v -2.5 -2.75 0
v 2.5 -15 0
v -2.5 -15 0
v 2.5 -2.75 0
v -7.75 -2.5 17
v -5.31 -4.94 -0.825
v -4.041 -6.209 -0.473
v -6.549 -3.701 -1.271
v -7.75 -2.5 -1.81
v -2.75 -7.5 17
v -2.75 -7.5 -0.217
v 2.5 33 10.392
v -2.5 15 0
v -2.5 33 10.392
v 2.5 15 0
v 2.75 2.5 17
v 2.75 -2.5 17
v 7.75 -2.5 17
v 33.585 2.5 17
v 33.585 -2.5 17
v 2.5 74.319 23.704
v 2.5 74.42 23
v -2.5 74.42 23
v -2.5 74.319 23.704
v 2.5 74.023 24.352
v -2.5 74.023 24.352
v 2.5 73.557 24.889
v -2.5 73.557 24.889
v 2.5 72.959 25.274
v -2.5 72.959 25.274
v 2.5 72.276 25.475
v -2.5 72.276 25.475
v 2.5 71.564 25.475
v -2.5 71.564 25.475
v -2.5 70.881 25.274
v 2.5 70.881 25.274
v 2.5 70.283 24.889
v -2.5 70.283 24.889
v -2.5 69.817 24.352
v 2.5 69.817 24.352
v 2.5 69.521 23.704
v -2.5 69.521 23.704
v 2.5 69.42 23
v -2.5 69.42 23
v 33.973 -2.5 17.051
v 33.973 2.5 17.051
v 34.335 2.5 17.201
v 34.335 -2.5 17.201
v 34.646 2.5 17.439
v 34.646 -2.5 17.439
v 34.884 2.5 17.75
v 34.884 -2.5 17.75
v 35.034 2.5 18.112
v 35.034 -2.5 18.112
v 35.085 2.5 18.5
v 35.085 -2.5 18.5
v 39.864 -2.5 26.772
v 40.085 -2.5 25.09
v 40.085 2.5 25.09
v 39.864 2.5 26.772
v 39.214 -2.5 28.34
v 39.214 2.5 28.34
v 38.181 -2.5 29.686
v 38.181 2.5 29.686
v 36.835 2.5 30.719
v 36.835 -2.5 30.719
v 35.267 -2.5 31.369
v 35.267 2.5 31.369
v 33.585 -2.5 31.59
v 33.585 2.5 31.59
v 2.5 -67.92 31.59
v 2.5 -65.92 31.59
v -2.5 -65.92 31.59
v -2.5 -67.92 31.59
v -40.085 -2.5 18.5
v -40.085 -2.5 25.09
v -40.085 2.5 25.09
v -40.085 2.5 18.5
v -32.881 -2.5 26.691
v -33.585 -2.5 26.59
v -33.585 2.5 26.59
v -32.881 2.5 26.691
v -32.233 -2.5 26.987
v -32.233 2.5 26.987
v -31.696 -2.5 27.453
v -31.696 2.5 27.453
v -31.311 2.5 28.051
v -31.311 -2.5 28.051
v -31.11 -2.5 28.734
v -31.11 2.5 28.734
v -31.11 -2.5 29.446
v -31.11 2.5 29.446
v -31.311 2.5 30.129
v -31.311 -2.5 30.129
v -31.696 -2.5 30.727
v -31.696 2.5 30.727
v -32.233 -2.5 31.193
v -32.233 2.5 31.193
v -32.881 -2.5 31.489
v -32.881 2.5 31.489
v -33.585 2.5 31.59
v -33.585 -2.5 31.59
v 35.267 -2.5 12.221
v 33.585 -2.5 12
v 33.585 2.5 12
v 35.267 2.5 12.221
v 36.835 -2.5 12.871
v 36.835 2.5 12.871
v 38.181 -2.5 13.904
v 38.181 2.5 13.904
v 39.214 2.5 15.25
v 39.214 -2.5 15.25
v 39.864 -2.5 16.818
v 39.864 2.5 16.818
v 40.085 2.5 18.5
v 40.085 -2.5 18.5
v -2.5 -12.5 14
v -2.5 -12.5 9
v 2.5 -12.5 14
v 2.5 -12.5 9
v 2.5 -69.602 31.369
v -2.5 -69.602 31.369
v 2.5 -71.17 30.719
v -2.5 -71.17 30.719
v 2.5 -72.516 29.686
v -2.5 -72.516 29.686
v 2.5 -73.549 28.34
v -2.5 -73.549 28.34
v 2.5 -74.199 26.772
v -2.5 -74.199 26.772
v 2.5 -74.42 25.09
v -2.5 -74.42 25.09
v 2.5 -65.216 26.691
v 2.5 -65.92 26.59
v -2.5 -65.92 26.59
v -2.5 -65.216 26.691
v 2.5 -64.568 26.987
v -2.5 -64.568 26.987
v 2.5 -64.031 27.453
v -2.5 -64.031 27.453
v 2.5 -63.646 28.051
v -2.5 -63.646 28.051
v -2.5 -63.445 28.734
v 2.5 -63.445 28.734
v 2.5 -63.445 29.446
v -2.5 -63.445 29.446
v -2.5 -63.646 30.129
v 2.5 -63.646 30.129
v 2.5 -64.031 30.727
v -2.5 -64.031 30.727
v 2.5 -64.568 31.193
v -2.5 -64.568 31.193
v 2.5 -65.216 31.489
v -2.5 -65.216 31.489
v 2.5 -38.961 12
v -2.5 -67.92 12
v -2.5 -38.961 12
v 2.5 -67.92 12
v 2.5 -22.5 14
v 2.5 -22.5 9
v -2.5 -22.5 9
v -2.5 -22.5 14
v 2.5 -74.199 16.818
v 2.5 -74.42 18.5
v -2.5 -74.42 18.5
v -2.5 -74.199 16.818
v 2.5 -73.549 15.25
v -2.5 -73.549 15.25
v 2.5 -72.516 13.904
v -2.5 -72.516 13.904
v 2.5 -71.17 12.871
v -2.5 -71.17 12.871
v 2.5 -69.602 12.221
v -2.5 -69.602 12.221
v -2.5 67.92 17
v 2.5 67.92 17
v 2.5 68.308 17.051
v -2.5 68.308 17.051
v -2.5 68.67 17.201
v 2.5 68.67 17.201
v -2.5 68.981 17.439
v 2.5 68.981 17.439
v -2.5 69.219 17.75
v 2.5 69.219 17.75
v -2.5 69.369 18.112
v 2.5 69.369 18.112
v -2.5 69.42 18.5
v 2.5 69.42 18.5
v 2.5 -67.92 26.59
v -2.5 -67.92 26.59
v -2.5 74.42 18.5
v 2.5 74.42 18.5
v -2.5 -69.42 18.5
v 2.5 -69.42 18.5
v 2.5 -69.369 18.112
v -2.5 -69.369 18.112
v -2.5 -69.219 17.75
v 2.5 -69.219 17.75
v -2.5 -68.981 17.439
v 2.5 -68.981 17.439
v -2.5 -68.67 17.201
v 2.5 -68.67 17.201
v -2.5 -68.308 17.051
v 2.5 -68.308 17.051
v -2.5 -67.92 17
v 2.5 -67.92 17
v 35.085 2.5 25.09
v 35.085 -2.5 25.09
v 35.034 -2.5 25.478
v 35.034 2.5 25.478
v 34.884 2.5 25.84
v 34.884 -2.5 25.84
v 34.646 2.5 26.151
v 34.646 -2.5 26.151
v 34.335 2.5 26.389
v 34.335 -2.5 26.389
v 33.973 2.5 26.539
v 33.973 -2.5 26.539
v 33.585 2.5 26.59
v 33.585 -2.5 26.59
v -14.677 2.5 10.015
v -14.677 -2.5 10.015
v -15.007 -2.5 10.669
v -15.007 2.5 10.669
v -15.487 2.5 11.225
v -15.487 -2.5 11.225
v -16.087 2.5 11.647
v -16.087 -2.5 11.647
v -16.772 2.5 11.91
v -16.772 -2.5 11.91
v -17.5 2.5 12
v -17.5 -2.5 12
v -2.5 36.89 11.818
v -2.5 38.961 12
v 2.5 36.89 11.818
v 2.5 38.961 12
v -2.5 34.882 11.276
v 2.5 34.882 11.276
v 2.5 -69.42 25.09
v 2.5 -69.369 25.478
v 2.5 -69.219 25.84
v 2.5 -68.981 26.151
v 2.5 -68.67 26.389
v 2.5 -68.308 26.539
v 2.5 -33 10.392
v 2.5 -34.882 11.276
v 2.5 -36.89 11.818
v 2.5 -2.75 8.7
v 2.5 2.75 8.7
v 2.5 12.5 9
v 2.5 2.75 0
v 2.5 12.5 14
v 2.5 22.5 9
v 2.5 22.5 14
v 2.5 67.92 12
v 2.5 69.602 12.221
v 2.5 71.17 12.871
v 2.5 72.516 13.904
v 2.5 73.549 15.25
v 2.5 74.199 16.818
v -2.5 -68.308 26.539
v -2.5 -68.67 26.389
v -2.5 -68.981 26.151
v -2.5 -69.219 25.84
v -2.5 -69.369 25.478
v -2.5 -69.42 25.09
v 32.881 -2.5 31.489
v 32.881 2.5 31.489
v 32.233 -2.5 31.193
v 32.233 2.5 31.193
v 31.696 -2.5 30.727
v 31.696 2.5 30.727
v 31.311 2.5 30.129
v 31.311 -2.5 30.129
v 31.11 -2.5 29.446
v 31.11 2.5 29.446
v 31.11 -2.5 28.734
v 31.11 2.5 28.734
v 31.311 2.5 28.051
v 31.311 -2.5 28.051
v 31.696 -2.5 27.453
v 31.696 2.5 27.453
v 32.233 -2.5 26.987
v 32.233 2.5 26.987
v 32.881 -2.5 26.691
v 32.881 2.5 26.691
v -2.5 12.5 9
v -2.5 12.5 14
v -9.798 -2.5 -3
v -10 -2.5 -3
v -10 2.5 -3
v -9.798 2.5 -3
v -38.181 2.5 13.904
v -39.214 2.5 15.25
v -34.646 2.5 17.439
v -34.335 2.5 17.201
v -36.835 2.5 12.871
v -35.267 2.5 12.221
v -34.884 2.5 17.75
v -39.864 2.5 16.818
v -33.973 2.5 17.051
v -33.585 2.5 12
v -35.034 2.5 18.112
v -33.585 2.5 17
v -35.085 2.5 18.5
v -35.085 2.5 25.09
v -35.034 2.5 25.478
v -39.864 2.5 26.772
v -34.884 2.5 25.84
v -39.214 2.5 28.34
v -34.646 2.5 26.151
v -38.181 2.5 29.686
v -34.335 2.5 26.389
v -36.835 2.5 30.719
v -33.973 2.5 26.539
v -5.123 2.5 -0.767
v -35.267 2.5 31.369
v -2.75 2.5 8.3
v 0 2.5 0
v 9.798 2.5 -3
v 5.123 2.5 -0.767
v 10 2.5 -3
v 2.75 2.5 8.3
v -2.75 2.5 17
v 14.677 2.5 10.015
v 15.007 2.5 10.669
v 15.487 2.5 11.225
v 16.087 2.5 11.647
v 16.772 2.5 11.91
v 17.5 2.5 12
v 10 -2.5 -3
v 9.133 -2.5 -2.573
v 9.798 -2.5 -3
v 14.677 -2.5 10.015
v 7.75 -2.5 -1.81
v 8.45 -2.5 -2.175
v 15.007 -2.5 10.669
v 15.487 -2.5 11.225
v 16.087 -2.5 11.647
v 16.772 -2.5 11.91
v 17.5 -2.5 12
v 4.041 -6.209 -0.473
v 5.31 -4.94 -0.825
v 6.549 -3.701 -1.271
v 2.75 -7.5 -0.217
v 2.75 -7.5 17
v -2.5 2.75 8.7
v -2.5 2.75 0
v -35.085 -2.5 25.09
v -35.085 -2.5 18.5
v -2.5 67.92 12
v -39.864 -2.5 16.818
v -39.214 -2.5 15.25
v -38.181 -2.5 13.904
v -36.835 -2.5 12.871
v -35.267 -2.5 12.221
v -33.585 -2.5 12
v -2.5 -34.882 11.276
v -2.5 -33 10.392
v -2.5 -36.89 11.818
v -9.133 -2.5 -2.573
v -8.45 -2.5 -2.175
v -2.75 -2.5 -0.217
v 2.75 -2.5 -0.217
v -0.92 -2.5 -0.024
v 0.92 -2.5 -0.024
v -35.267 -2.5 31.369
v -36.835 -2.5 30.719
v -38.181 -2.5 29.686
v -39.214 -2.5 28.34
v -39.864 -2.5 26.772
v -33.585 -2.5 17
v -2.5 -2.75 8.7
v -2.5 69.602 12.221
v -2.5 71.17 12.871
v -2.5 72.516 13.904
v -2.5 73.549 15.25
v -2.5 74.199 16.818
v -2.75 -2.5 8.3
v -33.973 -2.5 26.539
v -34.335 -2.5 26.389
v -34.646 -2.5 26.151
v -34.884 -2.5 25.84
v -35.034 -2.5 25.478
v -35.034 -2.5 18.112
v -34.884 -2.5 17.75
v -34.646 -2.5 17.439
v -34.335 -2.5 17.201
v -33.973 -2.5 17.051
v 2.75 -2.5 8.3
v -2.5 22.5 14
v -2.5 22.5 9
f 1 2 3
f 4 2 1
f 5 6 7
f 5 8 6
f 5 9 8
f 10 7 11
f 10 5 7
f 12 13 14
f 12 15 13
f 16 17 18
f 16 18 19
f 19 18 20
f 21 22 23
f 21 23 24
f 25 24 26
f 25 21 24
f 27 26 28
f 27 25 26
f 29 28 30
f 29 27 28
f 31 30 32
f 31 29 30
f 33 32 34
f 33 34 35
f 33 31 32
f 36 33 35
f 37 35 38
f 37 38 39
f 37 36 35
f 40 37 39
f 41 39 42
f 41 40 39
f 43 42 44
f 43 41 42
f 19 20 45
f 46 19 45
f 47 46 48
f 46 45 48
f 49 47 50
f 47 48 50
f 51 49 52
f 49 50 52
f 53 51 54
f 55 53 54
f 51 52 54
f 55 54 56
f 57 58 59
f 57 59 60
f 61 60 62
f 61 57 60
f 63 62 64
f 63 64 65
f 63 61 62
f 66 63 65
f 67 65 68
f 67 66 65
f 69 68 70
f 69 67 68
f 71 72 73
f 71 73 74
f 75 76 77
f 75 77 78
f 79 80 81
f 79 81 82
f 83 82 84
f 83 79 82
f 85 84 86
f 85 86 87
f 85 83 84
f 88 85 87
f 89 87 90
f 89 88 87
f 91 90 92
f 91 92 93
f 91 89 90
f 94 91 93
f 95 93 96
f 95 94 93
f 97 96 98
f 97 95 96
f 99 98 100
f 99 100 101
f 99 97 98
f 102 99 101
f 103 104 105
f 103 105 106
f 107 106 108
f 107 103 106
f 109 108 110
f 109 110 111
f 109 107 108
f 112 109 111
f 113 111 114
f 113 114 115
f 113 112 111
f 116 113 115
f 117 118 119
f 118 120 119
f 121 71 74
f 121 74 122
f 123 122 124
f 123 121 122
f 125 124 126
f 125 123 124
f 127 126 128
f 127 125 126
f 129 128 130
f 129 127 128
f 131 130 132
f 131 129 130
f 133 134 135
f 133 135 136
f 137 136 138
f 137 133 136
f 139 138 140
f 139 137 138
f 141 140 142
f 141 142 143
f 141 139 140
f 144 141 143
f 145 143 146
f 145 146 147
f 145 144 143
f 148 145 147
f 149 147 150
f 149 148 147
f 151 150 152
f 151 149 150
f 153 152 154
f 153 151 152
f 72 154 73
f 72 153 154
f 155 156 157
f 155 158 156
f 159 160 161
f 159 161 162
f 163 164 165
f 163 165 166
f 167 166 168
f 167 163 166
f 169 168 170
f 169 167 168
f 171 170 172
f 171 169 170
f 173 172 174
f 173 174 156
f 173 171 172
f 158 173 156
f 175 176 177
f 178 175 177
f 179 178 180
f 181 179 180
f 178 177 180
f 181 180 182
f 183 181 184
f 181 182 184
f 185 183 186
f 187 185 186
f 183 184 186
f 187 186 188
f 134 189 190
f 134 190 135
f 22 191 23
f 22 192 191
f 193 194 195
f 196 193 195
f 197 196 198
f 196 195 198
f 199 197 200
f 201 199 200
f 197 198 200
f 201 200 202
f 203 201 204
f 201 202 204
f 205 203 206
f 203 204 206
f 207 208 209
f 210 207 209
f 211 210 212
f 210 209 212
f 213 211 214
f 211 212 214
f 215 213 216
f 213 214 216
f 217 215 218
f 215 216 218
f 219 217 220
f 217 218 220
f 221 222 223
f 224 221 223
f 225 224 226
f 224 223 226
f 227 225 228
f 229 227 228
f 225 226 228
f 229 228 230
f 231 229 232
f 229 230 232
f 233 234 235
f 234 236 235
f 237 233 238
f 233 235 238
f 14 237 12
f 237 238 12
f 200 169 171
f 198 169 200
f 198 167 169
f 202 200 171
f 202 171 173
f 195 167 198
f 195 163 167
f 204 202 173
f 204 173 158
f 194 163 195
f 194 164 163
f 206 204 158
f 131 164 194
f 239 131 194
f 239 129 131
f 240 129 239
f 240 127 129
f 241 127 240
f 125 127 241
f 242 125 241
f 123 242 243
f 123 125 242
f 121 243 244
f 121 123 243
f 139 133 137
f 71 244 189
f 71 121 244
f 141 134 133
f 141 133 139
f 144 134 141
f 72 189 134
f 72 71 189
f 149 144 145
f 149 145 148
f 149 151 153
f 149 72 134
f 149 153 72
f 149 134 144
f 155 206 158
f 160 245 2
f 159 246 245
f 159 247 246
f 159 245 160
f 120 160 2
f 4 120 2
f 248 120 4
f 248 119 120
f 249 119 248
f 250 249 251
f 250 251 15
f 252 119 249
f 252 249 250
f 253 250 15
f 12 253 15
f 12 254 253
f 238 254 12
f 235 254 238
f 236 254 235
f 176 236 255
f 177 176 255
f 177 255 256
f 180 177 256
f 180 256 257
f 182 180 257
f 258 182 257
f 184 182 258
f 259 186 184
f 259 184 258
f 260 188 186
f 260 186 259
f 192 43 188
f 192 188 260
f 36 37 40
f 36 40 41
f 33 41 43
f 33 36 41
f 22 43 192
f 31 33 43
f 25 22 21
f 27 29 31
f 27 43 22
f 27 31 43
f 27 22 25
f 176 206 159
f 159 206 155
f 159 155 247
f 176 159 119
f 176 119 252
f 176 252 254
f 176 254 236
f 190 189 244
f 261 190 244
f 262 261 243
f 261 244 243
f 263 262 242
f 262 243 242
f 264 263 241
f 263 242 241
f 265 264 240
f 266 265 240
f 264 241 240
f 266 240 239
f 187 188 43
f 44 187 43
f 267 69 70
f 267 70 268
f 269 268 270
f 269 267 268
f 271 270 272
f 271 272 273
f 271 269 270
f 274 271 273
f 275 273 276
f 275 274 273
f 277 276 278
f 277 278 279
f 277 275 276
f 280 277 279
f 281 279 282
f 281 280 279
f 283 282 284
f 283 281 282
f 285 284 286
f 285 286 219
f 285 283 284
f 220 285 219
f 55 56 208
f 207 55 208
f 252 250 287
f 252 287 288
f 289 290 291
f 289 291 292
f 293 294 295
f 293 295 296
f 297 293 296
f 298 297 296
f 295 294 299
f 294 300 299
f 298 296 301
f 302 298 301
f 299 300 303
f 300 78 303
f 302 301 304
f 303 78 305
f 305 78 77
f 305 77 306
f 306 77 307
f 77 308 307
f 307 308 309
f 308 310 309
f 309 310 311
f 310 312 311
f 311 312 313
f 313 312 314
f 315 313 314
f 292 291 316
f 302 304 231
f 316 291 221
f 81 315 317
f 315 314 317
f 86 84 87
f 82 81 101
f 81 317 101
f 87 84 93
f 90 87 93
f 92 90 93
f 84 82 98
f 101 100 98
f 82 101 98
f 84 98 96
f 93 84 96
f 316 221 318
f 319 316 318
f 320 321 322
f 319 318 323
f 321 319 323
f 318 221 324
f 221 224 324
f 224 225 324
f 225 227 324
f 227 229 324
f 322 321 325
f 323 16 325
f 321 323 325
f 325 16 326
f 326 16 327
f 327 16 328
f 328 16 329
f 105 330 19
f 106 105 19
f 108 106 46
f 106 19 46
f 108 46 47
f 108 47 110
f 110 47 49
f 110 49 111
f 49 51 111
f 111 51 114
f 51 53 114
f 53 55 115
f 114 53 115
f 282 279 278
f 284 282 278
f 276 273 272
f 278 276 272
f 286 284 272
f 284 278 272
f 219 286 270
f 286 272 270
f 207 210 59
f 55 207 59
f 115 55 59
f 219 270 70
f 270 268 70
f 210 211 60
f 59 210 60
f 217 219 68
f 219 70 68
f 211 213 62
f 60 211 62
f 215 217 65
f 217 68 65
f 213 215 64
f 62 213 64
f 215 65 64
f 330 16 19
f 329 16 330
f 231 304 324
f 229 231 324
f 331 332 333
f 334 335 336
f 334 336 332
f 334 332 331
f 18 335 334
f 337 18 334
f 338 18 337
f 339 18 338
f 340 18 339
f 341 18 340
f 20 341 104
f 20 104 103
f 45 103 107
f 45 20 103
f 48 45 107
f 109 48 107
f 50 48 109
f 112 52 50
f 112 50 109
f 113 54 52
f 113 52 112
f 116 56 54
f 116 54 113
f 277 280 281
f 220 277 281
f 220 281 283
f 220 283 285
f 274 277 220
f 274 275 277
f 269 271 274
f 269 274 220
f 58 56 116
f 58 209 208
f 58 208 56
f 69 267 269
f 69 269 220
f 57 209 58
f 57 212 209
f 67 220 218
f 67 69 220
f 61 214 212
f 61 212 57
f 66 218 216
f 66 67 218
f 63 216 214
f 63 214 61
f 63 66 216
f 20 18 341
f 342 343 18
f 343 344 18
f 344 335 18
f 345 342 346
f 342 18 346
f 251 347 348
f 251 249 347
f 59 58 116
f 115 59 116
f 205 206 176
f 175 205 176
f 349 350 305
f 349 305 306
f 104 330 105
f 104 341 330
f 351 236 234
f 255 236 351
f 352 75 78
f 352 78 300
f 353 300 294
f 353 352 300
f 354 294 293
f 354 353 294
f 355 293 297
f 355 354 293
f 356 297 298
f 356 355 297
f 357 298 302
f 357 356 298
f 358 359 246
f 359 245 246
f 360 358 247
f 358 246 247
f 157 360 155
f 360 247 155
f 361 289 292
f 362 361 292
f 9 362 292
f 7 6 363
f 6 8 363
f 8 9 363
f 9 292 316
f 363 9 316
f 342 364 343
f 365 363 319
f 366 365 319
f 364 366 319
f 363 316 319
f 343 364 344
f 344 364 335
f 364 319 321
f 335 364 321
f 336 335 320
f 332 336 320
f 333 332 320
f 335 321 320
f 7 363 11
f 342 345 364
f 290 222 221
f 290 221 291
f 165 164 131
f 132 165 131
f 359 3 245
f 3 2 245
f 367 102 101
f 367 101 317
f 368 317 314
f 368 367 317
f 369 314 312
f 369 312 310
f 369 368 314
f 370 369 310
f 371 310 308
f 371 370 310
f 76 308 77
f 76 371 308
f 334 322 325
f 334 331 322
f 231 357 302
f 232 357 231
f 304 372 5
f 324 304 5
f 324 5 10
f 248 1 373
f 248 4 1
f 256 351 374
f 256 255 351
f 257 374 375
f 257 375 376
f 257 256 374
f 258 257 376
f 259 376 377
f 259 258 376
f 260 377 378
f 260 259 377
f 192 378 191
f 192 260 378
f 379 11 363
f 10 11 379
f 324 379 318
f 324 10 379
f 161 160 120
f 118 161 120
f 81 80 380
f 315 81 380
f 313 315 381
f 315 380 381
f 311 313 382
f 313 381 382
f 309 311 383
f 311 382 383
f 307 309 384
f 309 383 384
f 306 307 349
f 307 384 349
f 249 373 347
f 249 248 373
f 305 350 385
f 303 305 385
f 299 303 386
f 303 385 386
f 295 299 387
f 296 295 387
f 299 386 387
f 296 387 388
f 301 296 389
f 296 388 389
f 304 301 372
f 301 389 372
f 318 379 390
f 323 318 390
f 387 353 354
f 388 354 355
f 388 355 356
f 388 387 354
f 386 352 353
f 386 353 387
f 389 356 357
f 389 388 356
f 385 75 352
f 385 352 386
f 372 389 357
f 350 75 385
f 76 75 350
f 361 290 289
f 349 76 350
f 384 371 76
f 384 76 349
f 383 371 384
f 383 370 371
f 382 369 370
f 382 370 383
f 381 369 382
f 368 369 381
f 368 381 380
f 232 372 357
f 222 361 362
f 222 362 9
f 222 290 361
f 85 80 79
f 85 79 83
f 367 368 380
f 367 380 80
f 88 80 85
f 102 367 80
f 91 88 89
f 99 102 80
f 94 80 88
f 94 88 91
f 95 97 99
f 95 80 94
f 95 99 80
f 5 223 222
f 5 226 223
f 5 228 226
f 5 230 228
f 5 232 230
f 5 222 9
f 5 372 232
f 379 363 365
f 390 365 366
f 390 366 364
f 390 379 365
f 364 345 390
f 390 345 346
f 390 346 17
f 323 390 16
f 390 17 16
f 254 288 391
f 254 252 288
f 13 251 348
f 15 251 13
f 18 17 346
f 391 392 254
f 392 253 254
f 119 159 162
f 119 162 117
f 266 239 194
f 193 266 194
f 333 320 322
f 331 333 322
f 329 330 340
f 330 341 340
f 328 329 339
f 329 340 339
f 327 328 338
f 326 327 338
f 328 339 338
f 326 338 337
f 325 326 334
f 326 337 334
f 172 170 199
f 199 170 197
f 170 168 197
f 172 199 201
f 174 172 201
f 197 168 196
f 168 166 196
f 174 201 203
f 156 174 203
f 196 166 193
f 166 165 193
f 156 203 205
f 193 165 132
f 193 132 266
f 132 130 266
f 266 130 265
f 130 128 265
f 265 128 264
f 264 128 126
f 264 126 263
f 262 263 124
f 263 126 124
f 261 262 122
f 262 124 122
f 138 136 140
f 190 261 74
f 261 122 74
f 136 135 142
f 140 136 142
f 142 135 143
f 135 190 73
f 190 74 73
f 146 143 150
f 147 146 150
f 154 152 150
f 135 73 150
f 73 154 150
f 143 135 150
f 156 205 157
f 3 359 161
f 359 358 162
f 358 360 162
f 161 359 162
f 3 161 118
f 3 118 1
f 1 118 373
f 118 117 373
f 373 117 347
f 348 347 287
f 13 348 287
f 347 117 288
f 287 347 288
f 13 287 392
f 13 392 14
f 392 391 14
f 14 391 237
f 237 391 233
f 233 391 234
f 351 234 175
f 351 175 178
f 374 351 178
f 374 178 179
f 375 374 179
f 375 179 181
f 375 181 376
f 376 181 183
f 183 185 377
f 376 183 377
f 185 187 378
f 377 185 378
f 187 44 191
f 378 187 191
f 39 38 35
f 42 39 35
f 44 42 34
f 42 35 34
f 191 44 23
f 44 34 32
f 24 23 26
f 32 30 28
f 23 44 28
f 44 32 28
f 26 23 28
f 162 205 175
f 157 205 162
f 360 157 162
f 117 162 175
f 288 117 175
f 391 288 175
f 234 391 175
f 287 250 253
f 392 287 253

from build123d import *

# Parameters (mm, degrees)
SKETCH_W     = 10
SKETCH_H     = 5
PAD_DEPTH    = 2.5
PAD001_DEPTH = 2.5
PAD002_DEPTH = 20
POCKET_DEPTH = 10


with BuildPart() as vertical:
    # Sketch → Pad (new body, symmetric)
    with BuildSketch(Plane.YZ):
        with BuildLine():
            Line((74.42, 18.5), (74.42, 23))
            ThreePointArc((74.42, 23), (71.92, 25.5), (69.42, 23))
            Line((69.42, 18.499998), (69.42, 23))
            ThreePointArc((67.919993, 17), (68.980657, 17.439337), (69.42, 18.499998))
            Line((-67.919994, 17), (67.919993, 17))
            ThreePointArc((-69.42, 18.499998), (-68.980657, 17.439337), (-67.919994, 17))
            Line((-69.42, 25.090002), (-69.42, 18.499998))
            ThreePointArc((-67.919993, 26.59), (-68.980657, 26.150663), (-69.42, 25.090002))
            Line((-67.919993, 26.59), (-65.919993, 26.59))
            ThreePointArc((-65.919993, 26.59), (-63.419996, 29.090003), (-65.919999, 31.59))
            Line((-65.919999, 31.59), (-67.920001, 31.59))
            ThreePointArc((-67.920001, 31.59), (-72.516194, 29.686195), (-74.42, 25.090002))
            Line((-74.42, 18.499998), (-74.42, 25.090002))
            ThreePointArc((-74.42, 18.499998), (-72.516191, 13.903803), (-67.919994, 12))
            Line((-67.919994, 12), (-38.96077, 12))
            ThreePointArc((-33, 10.392302), (-35.873884, 11.59102), (-38.96077, 12))
            Line((-15, 0), (-33, 10.392302))
            Line((-15, 0), (-2.75, 0))
            Line((-2.75, 0), (-2.75, 8.7))
            Line((-2.75, 8.7), (2.75, 8.7))
            Line((2.75, 8.7), (2.75, 0))
            Line((2.75, 0), (15, 0))
            Line((15, 0), (33, 10.392302))
            ThreePointArc((38.96077, 12), (35.873884, 11.59102), (33, 10.392302))
            Line((38.96077, 12), (67.92, 12))
            ThreePointArc((67.92, 12), (72.516194, 13.903806), (74.42, 18.5))
        make_face()
        with Locations((-17.5, 11.5)):
            Rectangle(SKETCH_W, SKETCH_H, mode=Mode.SUBTRACT)
        with Locations((17.5, 11.5)):
            Rectangle(SKETCH_W, SKETCH_H, mode=Mode.SUBTRACT)
    extrude(amount=PAD_DEPTH, both=True)


with BuildPart() as fusion:
    # Sketch001 → Pad001 (new body, symmetric)
    with BuildSketch(Plane.XZ):
        with BuildLine():
            Line((17.5, 12.000002), (33.585004, 12))
            ThreePointArc((33.585004, 12), (38.181197, 13.903809), (40.085, 18.500004))
            Line((40.085, 25.089998), (40.085, 18.500004))
            ThreePointArc((40.085, 25.089998), (38.181197, 29.686193), (33.585006, 31.590002))
            ThreePointArc((33.585006, 31.590002), (31.085005, 29.090003), (33.585005, 26.590002))
            ThreePointArc((35.085, 25.089998), (34.645664, 26.150659), (33.585005, 26.590002))
            Line((35.085, 18.500005), (35.085, 25.089998))
            ThreePointArc((33.585005, 17), (34.645664, 17.439343), (35.085, 18.500005))
            Line((2.75, 17), (33.585005, 17))
            Line((2.75, 8.3), (2.75, 17))
            Line((-2.75, 8.3), (2.75, 8.3))
            Line((-2.75, 17.000002), (-2.75, 8.3))
            Line((-33.585, 17.000002), (-2.75, 17.000002))
            ThreePointArc((-35.085, 18.500005), (-34.645661, 17.439343), (-33.585, 17.000002))
            Line((-35.085, 18.500005), (-35.085, 25.089998))
            ThreePointArc((-33.585005, 26.590002), (-34.645664, 26.150659), (-35.085, 25.089998))
            ThreePointArc((-33.585005, 26.590002), (-31.085005, 29.090003), (-33.585006, 31.590002))
            ThreePointArc((-33.585006, 31.590002), (-38.181197, 29.686193), (-40.085, 25.089998))
            Line((-40.085, 25.089998), (-40.085, 18.500004))
            ThreePointArc((-40.085, 18.500004), (-38.181197, 13.903811), (-33.585005, 12.000002))
            Line((-33.585005, 12.000002), (-17.5, 12.000002))
            ThreePointArc((-14.676754, 10.014533), (-15.774254, 11.453937), (-17.5, 12.000002))
            Line((-14.676754, 10.014533), (-10, -3))
            Line((-10, -3), (10, -3))
            Line((10, -3), (14.676752, 10.014532))
            ThreePointArc((17.5, 12.000002), (15.774252, 11.453937), (14.676752, 10.014532))
        make_face()
    extrude(amount=PAD001_DEPTH, both=True)

    # Sketch002 → Pad002 (new body)
    with BuildSketch(Plane(origin=(0, 0, 17.000002), x_dir=(-1, 0, 0), z_dir=(0, 0, 1))):
        Polygon((-7.75, 2.5), (-2.75, 7.5), (-2.75, 2.5), align=None)
        Polygon((2.75, 7.5), (2.75, 2.5), (7.75, 2.5), align=None)
    extrude(amount=-PAD002_DEPTH)

    # Sketch003 → Pocket (cut)
    with BuildSketch(Plane(origin=(0, 2.5, 0), x_dir=(1, 0, 0), z_dir=(0, 1, 0))):
        with BuildLine():
            ThreePointArc((-10, 3.138593), (0, 0), (10, 3.138593))
            Line((-10, 3.138593), (10, 3.138593))
        make_face()
    extrude(amount=-POCKET_DEPTH, mode=Mode.SUBTRACT)

    # Fusion: union Vertical
    add(vertical.part)


solid = fusion.part
